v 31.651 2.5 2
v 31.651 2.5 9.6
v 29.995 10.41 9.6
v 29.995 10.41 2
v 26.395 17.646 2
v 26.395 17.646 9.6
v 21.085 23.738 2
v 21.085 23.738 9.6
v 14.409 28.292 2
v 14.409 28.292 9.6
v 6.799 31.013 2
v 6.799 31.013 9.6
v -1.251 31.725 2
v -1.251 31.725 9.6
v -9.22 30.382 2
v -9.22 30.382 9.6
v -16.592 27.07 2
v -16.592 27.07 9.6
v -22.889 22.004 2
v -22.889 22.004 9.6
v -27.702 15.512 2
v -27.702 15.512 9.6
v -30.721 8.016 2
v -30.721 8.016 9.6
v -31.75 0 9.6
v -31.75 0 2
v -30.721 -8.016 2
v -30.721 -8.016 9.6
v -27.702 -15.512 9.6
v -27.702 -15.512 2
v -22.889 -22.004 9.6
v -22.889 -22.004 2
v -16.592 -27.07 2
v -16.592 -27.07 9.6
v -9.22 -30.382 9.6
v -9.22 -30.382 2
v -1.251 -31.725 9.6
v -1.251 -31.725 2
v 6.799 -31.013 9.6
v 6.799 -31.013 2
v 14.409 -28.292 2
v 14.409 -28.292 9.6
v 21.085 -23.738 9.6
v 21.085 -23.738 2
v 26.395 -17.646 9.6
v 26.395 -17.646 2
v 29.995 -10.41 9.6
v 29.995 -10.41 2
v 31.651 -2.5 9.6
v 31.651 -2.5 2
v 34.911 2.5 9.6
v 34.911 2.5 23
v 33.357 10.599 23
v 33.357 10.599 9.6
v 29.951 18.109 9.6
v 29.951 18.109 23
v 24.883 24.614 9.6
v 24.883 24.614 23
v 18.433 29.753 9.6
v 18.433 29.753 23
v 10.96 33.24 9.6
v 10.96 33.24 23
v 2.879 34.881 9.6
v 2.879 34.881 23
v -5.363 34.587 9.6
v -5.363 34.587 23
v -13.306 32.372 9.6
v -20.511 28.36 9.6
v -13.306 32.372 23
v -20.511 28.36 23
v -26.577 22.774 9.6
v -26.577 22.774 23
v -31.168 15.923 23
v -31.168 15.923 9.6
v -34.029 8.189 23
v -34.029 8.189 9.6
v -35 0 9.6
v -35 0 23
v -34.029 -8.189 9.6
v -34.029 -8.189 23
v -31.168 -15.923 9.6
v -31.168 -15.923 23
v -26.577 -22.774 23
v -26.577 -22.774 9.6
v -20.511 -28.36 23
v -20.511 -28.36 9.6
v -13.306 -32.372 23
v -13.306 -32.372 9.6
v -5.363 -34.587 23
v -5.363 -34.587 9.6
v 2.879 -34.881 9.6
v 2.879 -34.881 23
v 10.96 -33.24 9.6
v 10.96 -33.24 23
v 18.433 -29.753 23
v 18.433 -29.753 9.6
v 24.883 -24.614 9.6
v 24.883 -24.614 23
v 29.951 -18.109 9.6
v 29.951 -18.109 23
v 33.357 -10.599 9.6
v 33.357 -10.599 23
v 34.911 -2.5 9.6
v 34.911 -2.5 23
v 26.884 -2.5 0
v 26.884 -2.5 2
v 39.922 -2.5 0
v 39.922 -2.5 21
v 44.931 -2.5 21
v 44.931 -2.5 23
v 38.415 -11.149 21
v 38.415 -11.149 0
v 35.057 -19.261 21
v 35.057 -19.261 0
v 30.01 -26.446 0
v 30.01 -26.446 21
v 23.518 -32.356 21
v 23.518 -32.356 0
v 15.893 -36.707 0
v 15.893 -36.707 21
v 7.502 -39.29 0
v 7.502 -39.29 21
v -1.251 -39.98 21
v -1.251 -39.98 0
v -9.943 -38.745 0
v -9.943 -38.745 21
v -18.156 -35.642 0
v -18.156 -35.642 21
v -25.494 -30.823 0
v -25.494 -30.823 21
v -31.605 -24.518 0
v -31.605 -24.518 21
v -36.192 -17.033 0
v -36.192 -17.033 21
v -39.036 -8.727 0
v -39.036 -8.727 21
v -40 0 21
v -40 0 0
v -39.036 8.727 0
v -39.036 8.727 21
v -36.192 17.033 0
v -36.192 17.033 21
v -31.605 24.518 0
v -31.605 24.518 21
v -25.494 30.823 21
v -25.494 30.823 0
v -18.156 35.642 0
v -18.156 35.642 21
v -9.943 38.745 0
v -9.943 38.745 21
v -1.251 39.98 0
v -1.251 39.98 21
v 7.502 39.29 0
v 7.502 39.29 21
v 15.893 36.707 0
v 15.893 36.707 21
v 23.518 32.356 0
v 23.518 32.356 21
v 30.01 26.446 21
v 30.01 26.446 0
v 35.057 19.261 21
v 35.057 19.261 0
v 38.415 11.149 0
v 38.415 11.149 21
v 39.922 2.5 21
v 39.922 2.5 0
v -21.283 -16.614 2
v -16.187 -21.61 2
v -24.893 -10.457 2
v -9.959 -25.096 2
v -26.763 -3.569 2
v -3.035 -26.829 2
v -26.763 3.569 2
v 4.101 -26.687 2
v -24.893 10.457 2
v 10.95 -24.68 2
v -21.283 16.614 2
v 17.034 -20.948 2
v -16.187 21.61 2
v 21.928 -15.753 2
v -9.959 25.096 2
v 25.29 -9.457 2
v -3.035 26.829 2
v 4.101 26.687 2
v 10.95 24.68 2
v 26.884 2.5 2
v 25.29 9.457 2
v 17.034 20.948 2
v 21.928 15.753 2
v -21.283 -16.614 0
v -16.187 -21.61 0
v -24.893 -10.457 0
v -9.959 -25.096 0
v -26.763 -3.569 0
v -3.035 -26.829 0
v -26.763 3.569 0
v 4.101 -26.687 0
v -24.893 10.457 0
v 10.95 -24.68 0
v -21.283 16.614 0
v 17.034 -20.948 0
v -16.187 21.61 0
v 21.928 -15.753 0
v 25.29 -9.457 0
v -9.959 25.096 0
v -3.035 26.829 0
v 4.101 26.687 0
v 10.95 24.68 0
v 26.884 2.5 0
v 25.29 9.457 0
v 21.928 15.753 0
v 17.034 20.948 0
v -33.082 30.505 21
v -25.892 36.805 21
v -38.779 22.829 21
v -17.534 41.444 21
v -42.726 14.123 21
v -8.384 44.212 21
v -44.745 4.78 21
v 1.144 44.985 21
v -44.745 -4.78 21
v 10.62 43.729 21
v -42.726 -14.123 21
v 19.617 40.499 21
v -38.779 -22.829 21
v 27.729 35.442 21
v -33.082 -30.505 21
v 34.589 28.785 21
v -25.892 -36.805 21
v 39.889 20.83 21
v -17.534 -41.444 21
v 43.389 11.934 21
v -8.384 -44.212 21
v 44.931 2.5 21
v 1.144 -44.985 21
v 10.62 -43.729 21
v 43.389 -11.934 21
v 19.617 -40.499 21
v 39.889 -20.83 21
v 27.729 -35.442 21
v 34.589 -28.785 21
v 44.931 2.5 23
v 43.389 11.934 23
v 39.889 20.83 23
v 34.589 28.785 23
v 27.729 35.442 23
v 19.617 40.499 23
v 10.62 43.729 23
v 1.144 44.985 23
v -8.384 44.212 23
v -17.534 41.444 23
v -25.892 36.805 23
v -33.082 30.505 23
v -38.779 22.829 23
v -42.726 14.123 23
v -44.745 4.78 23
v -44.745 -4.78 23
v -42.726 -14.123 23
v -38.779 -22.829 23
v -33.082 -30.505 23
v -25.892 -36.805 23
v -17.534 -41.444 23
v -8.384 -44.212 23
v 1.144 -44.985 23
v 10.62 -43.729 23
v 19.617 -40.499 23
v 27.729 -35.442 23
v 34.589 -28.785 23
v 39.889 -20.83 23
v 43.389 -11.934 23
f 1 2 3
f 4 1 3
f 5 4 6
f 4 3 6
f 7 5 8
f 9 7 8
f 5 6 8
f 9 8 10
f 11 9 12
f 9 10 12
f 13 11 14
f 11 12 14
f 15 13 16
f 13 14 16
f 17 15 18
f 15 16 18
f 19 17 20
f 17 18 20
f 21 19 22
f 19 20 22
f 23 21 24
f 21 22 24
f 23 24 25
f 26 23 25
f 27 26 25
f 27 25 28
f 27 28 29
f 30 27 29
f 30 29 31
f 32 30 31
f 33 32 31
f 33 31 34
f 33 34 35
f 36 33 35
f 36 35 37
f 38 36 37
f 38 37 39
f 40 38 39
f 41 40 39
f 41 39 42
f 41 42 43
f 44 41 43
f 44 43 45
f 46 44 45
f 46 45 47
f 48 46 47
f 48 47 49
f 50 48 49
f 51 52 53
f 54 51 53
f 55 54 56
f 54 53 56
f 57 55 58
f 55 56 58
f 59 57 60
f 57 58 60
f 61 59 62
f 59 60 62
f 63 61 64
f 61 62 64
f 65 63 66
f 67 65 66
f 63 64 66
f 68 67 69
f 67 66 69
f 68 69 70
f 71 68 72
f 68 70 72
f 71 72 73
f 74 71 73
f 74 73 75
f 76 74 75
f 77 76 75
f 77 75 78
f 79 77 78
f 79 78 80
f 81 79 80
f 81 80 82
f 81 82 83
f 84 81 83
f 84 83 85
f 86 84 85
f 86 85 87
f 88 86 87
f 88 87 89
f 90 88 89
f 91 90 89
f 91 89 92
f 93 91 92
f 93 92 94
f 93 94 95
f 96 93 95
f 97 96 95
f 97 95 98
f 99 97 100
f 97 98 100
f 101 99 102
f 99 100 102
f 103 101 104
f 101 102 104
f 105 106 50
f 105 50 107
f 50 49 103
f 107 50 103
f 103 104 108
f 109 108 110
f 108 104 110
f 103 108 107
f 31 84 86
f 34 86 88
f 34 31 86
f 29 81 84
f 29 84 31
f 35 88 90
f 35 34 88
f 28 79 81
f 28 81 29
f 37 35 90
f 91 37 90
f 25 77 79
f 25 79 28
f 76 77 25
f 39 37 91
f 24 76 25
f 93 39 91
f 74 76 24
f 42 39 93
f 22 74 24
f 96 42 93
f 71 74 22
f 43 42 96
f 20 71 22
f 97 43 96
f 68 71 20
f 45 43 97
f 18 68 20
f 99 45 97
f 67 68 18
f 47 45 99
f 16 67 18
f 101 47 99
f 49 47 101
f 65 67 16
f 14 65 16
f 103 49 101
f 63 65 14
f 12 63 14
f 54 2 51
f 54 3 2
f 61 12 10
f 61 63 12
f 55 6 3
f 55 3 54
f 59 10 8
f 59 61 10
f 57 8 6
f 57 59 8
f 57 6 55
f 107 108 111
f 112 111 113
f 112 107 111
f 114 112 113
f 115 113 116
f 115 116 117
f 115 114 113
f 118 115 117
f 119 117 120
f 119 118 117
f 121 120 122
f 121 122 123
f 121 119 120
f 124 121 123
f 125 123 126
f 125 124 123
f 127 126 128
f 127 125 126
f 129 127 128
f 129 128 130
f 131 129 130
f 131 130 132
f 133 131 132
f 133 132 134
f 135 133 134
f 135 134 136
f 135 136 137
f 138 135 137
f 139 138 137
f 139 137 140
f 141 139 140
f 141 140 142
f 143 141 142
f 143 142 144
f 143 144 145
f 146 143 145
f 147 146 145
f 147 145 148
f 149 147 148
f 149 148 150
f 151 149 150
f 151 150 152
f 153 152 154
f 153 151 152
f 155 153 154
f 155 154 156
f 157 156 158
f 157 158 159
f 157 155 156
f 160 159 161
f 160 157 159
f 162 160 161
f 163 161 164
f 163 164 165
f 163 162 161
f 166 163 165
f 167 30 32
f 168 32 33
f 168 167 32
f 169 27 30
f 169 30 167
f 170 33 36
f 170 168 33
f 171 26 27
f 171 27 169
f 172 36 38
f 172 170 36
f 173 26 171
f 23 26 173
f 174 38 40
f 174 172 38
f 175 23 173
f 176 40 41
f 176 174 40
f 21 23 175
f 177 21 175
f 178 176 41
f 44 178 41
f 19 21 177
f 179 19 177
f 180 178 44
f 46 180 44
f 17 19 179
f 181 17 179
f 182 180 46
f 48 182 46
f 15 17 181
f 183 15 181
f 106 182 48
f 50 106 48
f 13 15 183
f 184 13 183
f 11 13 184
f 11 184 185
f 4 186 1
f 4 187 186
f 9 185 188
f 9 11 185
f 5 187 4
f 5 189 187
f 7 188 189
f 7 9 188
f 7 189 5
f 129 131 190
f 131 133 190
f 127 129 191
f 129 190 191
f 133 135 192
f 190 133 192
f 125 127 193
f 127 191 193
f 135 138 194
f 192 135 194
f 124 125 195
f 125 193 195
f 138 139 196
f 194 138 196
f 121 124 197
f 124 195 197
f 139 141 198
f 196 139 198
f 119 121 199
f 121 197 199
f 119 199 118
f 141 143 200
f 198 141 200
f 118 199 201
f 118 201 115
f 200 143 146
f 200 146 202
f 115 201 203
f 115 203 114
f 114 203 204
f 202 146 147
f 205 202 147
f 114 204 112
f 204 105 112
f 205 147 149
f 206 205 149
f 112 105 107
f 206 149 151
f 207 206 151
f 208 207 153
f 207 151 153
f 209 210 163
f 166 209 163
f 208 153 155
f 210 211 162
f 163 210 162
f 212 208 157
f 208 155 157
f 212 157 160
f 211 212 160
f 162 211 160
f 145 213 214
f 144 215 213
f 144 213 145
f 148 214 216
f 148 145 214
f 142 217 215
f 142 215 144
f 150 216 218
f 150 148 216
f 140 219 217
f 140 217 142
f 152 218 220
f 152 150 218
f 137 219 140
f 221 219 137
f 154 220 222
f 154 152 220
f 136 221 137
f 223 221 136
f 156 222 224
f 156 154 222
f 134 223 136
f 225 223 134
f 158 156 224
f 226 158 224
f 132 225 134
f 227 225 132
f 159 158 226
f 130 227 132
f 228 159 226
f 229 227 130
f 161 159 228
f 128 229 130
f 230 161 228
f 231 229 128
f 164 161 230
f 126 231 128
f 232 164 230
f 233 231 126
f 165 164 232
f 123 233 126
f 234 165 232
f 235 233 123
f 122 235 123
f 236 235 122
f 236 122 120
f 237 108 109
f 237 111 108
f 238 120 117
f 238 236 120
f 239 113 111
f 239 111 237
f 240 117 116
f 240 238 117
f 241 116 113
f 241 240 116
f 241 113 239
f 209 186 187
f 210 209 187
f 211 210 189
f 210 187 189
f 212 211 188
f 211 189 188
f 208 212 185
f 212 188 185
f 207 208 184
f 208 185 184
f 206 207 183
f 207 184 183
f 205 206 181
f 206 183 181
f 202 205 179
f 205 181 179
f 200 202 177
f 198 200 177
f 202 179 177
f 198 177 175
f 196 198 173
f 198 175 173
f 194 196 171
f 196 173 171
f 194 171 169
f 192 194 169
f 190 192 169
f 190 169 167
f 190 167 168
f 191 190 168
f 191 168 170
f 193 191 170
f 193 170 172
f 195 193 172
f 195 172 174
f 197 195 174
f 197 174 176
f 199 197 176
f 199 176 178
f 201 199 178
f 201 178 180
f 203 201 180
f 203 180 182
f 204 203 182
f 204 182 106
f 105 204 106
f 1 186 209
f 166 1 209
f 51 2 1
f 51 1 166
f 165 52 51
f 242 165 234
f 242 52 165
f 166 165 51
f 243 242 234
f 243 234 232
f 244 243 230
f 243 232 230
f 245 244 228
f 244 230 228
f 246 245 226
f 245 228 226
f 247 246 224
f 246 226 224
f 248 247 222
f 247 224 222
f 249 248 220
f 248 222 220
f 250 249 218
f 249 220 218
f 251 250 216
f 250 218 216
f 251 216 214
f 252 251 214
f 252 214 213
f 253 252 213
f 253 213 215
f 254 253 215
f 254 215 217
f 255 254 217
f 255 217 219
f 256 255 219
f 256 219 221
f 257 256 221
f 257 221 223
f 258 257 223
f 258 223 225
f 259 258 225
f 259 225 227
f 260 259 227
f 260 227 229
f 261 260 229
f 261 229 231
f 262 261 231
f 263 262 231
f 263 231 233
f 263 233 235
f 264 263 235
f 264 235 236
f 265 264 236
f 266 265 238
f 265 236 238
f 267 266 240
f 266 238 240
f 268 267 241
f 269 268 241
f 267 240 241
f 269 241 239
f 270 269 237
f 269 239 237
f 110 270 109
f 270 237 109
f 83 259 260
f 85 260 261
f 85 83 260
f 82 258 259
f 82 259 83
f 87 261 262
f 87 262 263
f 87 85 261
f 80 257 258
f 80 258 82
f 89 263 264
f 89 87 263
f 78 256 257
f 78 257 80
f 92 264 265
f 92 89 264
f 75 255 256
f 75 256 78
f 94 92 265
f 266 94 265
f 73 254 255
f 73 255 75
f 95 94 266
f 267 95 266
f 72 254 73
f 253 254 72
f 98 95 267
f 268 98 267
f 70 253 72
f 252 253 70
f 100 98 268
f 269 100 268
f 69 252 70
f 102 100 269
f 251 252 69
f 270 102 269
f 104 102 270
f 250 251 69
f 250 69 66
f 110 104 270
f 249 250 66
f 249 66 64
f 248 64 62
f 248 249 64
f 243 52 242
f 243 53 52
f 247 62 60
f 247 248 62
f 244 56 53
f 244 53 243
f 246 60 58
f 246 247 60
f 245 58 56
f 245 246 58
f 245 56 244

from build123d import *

# Parameters (mm, degrees)
F0_R      = 45
F1_DEPTH  = 23
F2_R      = 35
F3_DEPTH  = 13.4
F4_R      = 31.75
F5_DEPTH  = 7.6
F6_R      = 27
F7_DEPTH  = 2.001
F8_R      = 45
F8_R_2    = 40
F9_DEPTH  = 21
F10_W     = 30
F10_H     = 5
F11_DEPTH = 23.001


with BuildPart() as f1:
    # F0 (on Top) → F1 (new body)
    with BuildSketch(Plane.XY):
        Circle(F0_R)
    extrude(amount=F1_DEPTH)

    # F2 (on face) → F3 (cut)
    with BuildSketch(Plane.XY.offset(23)):
        Circle(F2_R)
    extrude(amount=-F3_DEPTH, mode=Mode.SUBTRACT)

    # F4 (on face) → F5 (cut)
    with BuildSketch(Plane.XY.offset(9.6)):
        Circle(F4_R)
    extrude(amount=-F5_DEPTH, mode=Mode.SUBTRACT)

    # F6 (on face) → F7 (cut, through all)
    with BuildSketch(Plane.XY.offset(2)):
        Circle(F6_R)
    extrude(amount=-F7_DEPTH, mode=Mode.SUBTRACT)

    # F8 (on face) → F9 (cut)
    with BuildSketch(Plane(origin=(0, 0, 0), x_dir=(1, 0, 0), z_dir=(0, 0, -1))):
        Circle(F8_R)
        Circle(F8_R_2, mode=Mode.SUBTRACT)
    extrude(amount=-F9_DEPTH, mode=Mode.SUBTRACT)

    # F10 (on face) → F11 (cut, through all)
    with BuildSketch(Plane.XY.offset(23)):
        with Locations((35, 0)):
            Rectangle(F10_W, F10_H)
    extrude(amount=-F11_DEPTH, mode=Mode.SUBTRACT)


solid = f1.part
